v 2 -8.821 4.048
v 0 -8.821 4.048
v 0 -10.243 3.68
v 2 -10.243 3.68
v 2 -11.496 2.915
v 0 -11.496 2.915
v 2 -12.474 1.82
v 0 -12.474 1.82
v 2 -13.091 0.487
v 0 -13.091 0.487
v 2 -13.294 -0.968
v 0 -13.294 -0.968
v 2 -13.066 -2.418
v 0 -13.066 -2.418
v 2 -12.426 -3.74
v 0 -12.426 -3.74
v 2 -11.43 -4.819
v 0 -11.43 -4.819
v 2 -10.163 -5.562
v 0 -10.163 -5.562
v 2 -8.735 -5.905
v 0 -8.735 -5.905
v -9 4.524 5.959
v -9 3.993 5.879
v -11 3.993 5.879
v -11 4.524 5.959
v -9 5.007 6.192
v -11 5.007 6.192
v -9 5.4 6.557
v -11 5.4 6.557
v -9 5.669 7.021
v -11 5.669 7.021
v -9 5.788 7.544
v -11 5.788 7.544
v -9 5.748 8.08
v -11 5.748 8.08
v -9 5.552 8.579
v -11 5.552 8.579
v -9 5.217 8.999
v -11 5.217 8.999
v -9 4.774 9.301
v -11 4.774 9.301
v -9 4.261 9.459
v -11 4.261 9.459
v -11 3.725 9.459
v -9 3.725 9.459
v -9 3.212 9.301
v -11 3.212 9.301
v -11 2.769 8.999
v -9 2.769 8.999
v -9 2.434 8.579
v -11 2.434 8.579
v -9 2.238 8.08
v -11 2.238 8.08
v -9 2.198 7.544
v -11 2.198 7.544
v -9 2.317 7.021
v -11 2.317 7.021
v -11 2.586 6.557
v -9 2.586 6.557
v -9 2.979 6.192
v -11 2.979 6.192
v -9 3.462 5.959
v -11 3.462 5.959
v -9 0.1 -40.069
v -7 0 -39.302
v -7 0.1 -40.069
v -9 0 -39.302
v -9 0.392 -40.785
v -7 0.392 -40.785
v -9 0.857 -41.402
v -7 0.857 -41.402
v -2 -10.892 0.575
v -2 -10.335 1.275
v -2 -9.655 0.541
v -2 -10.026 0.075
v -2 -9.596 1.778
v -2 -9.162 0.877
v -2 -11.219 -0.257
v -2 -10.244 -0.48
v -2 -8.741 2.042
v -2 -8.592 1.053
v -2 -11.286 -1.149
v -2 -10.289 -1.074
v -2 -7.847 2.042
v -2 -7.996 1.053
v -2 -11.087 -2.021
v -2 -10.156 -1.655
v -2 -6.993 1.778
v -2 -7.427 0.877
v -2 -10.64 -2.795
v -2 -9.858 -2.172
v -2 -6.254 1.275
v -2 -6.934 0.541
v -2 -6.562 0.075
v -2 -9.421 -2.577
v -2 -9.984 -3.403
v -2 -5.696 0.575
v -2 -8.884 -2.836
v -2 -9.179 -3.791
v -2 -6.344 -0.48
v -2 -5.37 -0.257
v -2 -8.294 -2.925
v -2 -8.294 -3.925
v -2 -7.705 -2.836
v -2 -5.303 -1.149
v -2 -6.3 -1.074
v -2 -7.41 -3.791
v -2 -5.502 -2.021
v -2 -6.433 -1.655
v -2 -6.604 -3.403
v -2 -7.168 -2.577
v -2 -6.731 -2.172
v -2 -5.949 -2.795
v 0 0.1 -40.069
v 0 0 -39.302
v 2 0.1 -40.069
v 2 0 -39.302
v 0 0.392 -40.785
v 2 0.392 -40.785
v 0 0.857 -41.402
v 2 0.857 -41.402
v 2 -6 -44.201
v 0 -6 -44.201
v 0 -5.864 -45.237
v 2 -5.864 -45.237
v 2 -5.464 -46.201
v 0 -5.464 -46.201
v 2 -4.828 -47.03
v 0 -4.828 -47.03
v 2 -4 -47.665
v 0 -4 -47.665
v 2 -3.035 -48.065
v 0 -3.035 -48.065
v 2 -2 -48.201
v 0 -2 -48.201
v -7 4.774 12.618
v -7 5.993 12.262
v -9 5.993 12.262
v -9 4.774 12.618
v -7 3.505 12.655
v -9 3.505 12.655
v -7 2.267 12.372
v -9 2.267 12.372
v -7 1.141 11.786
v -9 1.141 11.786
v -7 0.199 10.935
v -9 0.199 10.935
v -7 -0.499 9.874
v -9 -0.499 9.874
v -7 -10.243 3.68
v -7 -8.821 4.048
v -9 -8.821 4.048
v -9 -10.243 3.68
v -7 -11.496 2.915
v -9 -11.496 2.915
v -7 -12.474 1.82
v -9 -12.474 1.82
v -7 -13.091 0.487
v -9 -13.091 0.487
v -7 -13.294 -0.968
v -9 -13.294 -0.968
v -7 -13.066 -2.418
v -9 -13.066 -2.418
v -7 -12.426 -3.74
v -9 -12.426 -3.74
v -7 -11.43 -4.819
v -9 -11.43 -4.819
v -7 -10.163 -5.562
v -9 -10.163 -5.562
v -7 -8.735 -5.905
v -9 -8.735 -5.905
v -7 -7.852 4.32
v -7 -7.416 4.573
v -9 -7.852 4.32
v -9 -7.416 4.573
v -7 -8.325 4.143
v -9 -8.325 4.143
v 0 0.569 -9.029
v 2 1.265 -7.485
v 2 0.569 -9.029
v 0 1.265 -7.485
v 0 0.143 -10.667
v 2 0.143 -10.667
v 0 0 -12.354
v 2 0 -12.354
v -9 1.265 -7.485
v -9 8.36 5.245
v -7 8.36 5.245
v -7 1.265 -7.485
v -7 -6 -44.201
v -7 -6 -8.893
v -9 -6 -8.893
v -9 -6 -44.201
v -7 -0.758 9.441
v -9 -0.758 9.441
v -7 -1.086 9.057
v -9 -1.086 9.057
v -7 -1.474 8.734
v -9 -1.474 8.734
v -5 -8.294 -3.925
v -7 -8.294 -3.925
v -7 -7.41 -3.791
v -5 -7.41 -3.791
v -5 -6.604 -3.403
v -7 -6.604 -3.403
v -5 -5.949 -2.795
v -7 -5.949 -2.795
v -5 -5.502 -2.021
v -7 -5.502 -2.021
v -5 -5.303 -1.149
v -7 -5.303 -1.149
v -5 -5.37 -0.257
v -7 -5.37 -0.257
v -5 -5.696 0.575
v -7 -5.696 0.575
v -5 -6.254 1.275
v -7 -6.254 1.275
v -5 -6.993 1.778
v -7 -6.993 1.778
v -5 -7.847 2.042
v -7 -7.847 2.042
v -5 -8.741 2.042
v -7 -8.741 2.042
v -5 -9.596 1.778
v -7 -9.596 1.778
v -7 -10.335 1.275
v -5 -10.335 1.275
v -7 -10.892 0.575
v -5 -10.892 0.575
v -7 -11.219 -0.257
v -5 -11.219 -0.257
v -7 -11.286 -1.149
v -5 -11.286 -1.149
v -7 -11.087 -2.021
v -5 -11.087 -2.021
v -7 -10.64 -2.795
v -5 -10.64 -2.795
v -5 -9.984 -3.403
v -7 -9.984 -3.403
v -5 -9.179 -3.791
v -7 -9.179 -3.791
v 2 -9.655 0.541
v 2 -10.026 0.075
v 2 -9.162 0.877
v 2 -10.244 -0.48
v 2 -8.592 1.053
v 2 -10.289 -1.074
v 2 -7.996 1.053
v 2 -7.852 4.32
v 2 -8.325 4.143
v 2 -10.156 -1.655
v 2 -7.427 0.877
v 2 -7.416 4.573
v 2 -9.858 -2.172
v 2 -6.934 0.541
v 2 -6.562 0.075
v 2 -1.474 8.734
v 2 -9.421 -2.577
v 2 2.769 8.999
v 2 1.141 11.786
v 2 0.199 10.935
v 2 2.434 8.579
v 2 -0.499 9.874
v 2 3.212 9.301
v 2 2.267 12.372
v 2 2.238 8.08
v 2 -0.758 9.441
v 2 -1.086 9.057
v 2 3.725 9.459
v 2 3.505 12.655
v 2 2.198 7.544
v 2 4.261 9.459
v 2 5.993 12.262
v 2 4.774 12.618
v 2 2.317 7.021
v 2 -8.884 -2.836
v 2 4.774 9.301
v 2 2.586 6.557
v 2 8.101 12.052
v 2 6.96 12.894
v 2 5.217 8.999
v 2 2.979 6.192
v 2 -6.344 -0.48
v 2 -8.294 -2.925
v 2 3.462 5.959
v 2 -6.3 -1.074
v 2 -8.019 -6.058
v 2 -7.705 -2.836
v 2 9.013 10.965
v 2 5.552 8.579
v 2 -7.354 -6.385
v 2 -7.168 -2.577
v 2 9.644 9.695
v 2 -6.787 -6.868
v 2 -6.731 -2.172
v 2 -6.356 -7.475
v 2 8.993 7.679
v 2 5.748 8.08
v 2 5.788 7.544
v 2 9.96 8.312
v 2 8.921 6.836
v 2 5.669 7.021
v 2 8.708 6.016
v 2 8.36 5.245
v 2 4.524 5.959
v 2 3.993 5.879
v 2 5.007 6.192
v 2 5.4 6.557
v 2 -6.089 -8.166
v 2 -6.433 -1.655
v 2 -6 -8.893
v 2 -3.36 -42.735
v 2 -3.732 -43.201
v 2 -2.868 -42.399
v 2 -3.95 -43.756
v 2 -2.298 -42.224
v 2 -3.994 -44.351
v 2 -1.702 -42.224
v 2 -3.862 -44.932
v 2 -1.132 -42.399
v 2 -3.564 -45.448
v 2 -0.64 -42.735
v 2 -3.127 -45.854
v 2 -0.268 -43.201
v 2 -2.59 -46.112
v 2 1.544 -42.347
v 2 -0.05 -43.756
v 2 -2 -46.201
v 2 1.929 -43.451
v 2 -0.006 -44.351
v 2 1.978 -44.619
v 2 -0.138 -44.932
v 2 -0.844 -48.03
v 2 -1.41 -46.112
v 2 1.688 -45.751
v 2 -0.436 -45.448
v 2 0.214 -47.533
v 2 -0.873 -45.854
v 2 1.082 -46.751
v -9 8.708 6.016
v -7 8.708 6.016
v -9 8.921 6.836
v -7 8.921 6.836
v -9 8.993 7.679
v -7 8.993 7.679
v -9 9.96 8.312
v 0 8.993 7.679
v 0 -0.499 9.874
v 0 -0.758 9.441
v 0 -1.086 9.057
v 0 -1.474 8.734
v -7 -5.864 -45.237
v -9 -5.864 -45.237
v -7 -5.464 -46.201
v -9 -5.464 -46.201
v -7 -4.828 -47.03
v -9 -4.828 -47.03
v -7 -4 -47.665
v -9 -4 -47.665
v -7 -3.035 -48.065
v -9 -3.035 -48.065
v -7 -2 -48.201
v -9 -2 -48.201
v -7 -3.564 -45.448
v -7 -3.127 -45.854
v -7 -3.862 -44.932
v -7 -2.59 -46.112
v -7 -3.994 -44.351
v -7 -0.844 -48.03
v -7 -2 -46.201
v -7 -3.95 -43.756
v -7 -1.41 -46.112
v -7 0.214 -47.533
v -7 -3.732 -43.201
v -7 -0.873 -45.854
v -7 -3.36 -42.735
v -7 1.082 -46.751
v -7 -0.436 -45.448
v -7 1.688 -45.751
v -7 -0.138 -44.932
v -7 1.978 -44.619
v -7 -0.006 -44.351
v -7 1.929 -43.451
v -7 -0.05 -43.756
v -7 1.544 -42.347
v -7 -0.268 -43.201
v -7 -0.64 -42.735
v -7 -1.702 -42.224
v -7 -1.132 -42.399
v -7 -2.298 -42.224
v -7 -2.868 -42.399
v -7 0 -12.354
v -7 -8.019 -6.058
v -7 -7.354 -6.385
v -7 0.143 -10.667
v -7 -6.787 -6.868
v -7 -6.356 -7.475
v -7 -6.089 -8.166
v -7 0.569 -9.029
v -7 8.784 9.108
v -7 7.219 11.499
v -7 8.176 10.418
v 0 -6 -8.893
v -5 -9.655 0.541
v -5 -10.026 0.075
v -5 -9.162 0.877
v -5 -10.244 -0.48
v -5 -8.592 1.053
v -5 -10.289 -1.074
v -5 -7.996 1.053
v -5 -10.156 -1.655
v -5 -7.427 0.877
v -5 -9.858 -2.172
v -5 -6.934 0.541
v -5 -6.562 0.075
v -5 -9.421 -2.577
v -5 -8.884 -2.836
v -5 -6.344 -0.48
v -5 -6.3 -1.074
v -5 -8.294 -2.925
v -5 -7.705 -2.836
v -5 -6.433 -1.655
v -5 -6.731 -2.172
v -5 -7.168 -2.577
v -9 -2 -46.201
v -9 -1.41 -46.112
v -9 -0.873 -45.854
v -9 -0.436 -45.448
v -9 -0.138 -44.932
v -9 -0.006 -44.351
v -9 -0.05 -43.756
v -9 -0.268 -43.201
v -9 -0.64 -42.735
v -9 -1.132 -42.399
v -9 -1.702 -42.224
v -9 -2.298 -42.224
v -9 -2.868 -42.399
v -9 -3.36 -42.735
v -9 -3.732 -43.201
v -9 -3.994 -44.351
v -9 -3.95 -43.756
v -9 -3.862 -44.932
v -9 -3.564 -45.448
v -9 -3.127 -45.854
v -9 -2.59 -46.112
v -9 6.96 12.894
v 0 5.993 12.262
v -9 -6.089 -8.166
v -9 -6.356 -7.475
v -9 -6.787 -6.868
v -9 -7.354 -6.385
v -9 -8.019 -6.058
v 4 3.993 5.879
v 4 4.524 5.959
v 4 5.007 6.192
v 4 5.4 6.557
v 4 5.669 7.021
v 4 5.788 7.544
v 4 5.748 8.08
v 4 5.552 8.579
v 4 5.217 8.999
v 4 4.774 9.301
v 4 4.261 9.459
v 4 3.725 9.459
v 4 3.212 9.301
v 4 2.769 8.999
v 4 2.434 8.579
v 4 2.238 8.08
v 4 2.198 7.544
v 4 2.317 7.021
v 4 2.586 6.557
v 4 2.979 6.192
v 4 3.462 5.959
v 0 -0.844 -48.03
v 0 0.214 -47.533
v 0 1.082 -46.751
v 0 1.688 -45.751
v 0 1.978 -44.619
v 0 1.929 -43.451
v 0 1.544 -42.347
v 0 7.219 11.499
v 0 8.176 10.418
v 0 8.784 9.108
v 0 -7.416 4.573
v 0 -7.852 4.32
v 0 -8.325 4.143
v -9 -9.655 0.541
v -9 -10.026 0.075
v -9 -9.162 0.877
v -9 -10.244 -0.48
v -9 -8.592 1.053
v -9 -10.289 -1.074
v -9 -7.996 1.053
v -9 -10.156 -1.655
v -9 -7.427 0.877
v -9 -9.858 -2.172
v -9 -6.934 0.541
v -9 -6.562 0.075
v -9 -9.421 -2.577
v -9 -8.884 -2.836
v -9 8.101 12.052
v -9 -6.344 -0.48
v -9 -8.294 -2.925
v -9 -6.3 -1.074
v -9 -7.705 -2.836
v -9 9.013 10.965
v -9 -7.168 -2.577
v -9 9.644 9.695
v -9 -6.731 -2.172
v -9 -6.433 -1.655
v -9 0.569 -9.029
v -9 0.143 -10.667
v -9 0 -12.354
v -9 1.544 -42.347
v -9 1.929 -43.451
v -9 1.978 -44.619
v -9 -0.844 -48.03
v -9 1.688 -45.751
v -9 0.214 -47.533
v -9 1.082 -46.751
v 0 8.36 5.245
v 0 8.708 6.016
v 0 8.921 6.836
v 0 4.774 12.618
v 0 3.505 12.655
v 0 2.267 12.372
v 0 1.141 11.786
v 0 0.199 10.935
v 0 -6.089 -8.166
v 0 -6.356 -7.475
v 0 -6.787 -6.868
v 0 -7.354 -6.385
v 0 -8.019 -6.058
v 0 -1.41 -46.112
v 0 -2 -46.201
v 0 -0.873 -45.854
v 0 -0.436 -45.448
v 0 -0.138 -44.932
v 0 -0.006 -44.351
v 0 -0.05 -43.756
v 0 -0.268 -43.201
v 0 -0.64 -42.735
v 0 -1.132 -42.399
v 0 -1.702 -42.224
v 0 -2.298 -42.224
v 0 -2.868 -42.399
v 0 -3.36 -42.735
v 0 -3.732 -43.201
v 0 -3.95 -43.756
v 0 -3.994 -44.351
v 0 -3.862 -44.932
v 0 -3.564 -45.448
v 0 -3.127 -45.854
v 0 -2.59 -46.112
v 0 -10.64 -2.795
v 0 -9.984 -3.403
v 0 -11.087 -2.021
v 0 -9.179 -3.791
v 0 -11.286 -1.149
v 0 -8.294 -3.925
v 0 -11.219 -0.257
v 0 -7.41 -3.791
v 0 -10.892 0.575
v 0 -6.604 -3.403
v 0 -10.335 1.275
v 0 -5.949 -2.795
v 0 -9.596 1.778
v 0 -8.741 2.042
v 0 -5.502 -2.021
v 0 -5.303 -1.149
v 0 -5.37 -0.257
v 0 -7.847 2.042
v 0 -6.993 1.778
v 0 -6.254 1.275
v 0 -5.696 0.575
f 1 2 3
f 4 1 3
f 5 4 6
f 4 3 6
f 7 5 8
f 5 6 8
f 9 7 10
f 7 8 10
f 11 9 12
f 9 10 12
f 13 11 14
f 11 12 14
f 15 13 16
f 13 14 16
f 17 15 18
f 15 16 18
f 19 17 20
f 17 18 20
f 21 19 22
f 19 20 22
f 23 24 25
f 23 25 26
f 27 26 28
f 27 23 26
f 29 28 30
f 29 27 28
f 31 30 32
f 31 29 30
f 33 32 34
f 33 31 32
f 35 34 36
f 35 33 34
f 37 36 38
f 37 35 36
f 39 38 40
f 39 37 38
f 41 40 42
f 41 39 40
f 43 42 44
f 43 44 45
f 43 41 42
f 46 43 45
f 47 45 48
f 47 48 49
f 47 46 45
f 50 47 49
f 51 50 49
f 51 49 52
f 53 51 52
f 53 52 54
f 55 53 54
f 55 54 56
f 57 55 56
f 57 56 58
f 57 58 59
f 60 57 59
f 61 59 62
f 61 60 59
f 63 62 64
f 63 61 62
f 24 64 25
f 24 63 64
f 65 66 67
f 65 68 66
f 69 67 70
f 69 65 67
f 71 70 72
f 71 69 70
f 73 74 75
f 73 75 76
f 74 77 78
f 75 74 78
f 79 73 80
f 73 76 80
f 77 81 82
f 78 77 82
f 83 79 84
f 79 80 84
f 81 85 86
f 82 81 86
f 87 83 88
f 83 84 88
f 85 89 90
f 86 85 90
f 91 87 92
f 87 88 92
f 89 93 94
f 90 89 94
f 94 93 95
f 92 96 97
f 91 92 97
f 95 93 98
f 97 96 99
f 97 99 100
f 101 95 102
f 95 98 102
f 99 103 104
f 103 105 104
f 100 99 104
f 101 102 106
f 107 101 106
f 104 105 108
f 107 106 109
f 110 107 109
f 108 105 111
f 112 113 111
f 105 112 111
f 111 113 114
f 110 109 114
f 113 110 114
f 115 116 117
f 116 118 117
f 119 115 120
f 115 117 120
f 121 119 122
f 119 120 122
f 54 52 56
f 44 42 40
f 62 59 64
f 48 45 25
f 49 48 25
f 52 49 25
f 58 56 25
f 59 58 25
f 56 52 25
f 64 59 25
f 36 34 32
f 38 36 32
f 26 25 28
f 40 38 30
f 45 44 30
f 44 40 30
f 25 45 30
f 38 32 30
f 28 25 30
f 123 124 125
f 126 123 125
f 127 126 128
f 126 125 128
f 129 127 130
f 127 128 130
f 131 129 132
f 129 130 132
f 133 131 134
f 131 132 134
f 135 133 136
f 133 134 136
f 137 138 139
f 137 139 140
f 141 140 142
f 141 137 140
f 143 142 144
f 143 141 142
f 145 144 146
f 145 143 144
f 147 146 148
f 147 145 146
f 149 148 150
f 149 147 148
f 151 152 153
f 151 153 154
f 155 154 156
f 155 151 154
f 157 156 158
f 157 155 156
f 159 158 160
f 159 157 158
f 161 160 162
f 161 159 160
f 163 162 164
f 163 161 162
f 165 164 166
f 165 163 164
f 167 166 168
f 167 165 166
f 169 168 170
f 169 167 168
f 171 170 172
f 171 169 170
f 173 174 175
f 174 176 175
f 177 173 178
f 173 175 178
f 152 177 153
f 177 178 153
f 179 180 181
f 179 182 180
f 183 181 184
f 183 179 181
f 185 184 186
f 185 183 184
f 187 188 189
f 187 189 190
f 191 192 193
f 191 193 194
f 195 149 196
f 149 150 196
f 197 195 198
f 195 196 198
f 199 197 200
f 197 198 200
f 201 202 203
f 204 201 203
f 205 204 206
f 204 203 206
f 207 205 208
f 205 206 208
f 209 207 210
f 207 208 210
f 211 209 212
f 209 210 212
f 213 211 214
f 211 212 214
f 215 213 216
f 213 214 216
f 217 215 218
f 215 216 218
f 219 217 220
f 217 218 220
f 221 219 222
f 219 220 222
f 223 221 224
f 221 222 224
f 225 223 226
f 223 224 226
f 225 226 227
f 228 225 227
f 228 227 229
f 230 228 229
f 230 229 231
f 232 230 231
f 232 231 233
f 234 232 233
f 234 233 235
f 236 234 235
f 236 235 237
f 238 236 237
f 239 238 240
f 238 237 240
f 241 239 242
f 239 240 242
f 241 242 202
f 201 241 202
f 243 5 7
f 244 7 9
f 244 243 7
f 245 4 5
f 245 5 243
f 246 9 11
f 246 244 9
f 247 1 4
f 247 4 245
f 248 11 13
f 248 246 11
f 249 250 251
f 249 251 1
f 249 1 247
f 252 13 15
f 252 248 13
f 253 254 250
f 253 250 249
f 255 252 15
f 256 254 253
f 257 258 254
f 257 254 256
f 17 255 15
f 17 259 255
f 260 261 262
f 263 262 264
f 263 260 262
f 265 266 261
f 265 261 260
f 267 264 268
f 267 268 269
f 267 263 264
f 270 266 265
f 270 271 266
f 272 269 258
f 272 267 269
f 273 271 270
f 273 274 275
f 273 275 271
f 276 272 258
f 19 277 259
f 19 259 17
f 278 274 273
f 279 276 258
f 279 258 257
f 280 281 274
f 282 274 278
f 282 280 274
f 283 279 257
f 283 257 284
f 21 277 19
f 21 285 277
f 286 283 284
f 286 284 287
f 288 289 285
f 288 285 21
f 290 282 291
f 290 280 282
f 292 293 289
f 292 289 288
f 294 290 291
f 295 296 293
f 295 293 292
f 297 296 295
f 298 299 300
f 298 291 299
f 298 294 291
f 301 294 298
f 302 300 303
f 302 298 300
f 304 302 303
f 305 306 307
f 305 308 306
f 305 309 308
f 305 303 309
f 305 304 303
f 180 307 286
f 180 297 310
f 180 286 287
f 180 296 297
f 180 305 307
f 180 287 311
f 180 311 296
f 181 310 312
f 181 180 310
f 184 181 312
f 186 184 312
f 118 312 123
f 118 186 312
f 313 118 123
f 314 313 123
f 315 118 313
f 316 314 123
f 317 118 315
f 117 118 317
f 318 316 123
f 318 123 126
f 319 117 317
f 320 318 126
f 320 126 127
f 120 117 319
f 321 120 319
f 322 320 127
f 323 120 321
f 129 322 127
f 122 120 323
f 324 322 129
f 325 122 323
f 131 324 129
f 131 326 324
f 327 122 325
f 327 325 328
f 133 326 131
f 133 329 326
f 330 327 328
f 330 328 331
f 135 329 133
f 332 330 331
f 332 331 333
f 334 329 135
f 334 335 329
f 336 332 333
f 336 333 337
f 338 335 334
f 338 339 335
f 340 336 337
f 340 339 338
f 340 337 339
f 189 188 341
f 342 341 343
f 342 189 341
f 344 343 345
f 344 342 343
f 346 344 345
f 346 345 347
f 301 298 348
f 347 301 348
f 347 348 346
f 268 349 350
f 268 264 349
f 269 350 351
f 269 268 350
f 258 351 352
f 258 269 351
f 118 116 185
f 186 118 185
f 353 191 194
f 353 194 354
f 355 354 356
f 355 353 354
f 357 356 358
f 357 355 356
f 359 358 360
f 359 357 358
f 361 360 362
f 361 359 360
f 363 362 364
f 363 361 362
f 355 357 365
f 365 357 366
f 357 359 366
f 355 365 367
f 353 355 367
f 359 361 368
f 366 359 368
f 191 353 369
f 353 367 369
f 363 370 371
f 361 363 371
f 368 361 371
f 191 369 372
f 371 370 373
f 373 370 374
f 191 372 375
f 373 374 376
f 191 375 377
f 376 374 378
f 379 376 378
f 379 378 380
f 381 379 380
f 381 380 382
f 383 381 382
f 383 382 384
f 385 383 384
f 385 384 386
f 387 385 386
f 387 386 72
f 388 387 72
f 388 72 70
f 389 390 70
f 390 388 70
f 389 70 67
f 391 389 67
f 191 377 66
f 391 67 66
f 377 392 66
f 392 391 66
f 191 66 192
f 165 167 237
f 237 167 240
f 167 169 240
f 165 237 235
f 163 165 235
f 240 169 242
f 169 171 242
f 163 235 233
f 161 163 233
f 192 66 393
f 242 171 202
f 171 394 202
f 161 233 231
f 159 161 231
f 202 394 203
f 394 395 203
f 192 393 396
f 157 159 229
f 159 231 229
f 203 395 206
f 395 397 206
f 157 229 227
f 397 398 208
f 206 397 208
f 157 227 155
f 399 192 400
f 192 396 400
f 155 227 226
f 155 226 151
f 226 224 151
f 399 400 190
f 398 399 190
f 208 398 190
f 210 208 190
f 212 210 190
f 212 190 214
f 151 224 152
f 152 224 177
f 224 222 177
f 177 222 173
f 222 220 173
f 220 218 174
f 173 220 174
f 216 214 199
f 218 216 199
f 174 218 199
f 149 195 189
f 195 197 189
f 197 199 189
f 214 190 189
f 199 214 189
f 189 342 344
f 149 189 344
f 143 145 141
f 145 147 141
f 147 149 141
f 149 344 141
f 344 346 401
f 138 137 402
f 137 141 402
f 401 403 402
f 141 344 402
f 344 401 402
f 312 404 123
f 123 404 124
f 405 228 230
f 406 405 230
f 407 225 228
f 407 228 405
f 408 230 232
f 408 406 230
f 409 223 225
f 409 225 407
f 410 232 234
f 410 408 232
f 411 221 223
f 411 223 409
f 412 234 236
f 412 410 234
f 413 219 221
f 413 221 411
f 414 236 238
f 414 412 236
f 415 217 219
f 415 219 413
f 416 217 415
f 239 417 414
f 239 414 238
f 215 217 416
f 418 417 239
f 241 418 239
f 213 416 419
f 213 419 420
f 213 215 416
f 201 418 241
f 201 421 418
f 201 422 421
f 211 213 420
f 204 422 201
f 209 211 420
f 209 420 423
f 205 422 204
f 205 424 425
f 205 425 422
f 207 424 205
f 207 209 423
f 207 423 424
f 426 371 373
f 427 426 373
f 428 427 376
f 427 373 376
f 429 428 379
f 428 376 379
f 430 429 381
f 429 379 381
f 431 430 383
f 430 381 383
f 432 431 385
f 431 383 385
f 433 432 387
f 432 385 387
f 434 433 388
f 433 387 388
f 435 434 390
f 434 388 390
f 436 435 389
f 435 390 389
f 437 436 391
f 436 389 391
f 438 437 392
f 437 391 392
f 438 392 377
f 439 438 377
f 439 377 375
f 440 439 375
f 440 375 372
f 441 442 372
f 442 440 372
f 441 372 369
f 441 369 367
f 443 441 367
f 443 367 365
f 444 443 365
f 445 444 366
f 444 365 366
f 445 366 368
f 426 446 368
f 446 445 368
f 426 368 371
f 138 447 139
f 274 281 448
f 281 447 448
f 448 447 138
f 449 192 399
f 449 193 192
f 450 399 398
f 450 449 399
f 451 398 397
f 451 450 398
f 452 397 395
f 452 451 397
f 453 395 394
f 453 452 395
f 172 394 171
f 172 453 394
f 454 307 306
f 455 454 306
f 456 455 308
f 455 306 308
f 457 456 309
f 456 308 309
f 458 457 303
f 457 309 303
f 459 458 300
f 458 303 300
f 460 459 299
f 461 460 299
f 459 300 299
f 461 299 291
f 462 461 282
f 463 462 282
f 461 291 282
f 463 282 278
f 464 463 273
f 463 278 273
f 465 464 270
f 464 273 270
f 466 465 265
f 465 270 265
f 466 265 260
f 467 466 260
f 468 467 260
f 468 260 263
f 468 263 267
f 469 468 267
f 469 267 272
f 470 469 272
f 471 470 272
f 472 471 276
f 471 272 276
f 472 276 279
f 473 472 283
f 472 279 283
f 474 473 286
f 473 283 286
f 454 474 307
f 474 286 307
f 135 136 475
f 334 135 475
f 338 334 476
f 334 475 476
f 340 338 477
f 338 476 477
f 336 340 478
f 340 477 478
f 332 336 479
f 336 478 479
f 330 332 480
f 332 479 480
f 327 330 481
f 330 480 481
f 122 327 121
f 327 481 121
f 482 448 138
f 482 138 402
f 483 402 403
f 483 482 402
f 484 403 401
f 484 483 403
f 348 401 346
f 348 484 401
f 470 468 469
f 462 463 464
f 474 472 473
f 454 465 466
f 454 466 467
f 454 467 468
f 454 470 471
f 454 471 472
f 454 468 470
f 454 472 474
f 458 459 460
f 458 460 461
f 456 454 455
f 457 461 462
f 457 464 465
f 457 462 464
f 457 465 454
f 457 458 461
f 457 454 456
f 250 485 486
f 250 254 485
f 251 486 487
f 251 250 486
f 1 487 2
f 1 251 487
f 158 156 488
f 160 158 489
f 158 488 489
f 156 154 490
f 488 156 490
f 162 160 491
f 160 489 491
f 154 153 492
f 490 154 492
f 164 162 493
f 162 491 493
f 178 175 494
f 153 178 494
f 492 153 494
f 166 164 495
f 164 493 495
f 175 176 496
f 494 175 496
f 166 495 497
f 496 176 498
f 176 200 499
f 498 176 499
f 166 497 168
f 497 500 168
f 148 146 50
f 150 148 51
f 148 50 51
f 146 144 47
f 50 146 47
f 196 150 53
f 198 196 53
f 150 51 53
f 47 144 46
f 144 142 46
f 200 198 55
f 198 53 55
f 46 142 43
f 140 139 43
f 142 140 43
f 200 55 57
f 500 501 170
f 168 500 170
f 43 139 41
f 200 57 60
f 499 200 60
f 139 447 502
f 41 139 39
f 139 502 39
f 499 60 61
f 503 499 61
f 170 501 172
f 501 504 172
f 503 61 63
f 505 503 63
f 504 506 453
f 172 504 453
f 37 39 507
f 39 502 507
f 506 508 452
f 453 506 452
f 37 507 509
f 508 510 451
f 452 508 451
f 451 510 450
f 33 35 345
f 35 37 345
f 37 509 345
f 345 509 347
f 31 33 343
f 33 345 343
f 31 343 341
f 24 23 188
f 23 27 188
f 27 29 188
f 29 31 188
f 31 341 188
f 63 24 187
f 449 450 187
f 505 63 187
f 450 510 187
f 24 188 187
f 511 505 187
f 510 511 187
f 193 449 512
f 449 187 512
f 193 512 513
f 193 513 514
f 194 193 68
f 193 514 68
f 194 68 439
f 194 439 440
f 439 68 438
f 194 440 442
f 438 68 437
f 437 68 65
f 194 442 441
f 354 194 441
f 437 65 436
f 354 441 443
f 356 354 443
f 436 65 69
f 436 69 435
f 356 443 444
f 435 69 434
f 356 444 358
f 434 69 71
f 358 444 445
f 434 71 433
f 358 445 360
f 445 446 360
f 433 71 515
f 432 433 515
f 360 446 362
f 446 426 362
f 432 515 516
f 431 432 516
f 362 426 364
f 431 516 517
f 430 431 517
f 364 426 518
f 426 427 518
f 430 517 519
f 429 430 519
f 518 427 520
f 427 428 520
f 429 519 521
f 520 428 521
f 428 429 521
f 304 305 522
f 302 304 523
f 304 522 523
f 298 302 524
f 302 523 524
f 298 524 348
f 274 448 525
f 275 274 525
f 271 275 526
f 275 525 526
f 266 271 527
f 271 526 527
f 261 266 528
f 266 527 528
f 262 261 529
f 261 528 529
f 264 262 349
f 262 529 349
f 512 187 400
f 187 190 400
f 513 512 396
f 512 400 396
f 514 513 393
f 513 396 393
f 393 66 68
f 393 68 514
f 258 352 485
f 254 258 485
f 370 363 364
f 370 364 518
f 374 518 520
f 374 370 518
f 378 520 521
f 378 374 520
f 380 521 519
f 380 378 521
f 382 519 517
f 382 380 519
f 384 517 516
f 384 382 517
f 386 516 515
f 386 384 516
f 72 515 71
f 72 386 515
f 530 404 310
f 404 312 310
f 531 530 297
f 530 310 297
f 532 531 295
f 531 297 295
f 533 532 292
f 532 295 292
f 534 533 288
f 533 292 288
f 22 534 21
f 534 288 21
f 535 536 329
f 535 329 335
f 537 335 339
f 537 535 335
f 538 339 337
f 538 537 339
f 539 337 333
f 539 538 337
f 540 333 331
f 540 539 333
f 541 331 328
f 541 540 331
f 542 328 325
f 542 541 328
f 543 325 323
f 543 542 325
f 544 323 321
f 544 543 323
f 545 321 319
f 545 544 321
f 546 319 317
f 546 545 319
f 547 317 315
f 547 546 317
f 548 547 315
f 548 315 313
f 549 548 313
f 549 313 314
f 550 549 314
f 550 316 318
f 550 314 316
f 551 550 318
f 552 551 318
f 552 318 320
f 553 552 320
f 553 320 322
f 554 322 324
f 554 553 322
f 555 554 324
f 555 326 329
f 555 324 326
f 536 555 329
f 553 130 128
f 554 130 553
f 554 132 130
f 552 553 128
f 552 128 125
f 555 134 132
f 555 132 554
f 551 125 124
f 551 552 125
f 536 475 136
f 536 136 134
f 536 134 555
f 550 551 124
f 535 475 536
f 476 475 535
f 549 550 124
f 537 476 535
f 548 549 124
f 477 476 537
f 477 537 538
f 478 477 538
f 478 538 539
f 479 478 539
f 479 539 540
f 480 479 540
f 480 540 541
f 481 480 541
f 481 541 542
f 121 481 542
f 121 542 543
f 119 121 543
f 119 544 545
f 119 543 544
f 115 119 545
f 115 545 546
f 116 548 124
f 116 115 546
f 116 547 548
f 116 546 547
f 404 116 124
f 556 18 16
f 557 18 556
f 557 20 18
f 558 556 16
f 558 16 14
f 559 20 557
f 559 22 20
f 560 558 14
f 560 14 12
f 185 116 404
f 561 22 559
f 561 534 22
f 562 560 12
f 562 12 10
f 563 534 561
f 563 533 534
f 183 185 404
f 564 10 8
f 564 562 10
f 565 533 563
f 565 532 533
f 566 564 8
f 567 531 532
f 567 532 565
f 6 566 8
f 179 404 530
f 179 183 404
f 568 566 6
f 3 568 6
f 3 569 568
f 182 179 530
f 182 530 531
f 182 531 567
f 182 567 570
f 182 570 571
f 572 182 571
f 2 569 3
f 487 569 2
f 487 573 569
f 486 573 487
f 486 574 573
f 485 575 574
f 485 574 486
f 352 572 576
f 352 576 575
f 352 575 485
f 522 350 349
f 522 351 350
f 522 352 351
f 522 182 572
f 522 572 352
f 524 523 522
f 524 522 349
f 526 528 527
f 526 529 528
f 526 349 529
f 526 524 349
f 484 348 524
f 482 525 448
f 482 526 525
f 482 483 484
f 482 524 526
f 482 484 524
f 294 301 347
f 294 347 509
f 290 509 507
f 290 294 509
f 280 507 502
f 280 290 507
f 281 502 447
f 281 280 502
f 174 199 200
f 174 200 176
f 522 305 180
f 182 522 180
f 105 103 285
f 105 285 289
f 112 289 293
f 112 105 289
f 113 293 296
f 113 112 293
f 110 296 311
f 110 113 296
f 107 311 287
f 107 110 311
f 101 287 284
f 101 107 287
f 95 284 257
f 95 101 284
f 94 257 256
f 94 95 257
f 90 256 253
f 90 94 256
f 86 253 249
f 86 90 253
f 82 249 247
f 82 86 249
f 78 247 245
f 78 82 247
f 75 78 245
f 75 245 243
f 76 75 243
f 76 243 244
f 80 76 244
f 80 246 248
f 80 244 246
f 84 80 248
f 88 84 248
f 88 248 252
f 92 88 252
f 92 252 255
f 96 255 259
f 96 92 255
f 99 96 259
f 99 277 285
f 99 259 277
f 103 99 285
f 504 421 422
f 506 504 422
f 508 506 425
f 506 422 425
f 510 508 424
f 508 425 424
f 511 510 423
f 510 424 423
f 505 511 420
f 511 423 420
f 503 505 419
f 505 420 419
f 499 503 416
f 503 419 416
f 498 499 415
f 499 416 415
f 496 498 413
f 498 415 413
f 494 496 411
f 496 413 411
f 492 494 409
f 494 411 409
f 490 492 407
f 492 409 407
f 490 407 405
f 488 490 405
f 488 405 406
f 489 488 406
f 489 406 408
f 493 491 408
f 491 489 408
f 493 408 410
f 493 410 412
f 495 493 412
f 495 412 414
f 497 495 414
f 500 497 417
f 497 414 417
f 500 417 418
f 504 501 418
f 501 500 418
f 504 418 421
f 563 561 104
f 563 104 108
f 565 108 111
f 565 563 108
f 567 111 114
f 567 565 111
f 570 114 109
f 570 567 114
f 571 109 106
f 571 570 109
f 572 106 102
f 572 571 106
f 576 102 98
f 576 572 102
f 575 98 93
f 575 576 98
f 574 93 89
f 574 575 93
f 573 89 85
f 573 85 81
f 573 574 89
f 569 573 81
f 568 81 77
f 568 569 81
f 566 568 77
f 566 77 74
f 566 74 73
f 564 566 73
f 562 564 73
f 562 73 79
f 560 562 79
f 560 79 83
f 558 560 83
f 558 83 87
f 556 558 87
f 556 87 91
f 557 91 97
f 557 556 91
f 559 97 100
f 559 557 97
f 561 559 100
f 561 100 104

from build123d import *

# Parameters (mm, degrees)
EXTRUDE_1_DEPTH          = 2
SKETCH_1_4_R             = 3
EXTRUDE_2_DEPTH          = 2
CUT_EXTRUDE_1_DEPTH      = 51.040969284
CUT_EXTRUDE_1_DEPTH_BACK = 51.040969284
SKETCH_1_3_R             = 2
FILLET_1_R               = 3
EXTRUDE_START            = -2
SKETCH_2_R               = 2
EXTRUDE_3_DEPTH          = 2
SKETCH_2_3_R             = 1.8
EXTRUDE_4_DEPTH          = 2
EXTRUDE_6_DEPTH          = 2
EXTRUDE_START_2          = -5.5
EXTRUDE_5_DEPTH          = 5.5
FILLET_3_R               = 10


with BuildPart() as part:
    # 草图1 → 凸台-拉伸1 (new body)
    with BuildSketch(Plane(origin=(0, 0, 0), x_dir=(0, 0, -1), z_dir=(1, 0, 0))):
        with BuildLine():
            Line((40.737143614, 0), (0, 0))
            Line((0, 0), (2.48051592, -3.542543867))
            ThreePointArc((2.48051592, -3.542543867), (4.165783411, -4.487079684), (5.367176995, -6))
            Line((5.367176995, -6), (44.201245229, -6))
            ThreePointArc((44.201245229, -6), (40.737143614, -4), (40.737143614, 0))
        make_face()
        with BuildLine():
            Line((2.48051592, -3.542543867), (0, 0))
            Line((0, 0), (-2.681672007, 3.829824531))
            ThreePointArc((-2.681672007, 3.829824531), (-4.811127311, -0.102785303), (-9.234888361, -0.758786959))
            Line((-9.234888361, -0.758786959), (-4.072700434, -8.131155358))
            ThreePointArc((-4.072700434, -8.131155358), (-1.94324513, -4.198545524), (2.48051592, -3.542543867))
        make_face()
        with BuildLine():
            ThreePointArc((48.201245229, -2), (45.23652141, 1.863703305), (40.737143614, 0))
            Line((40.737143614, 0), (44.201245229, 0))
            ThreePointArc((44.201245229, 0), (45.615458792, -0.585786438), (46.201245229, -2))
            ThreePointArc((46.201245229, -2), (45.615458792, -3.414213562), (44.201245229, -4))
            Line((44.201245229, -4), (44.201245229, -6))
            ThreePointArc((44.201245229, -6), (47.029672354, -4.828427125), (48.201245229, -2))
        make_face()
        with BuildLine():
            Line((44.201245229, 0), (40.737143614, 0))
            ThreePointArc((40.737143614, 0), (40.737143614, -4), (44.201245229, -6))
            Line((44.201245229, -6), (44.201245229, -4))
            ThreePointArc((44.201245229, -4), (42.201245229, -2), (44.201245229, 0))
        make_face()
        with BuildLine():
            ThreePointArc((5.367176995, -6), (4.165783411, -4.487079684), (2.48051592, -3.542543867))
            Line((2.48051592, -3.542543867), (4.201245229, -6))
            Line((4.201245229, -6), (5.367176995, -6))
        make_face()
        with BuildLine():
            Line((4.201245229, -6), (2.48051592, -3.542543867))
            ThreePointArc((2.48051592, -3.542543867), (-1.94324513, -4.198545524), (-4.072700434, -8.131155358))
            Line((-4.072700434, -8.131155358), (-2.351971125, -10.588611491))
            Line((-2.351971125, -10.588611491), (-1.532819081, -10.015035054))
            ThreePointArc((-1.532819081, -10.015035054), (-0.796092257, -5.836849613), (3.382093185, -6.573576436))
            Line((3.382093185, -6.573576436), (4.201245229, -6))
        make_face()
        with BuildLine():
            ThreePointArc((-9.234888361, -0.758786959), (-4.811127311, -0.102785303), (-2.681672007, 3.829824531))
            Line((-2.681672007, 3.829824531), (-4.402401316, 6.287280664))
            Line((-4.402401316, 6.287280664), (-6.040705405, 5.140127792))
            ThreePointArc((-6.040705405, 5.140127792), (-5.771575592, 4.594386518), (-5.679009493, 3.992974919))
            ThreePointArc((-5.679009493, 3.992974919), (-7.077597894, 2.085541017), (-9.317313582, 2.845822046))
            Line((-9.317313582, 2.845822046), (-10.95561767, 1.698669174))
            Line((-10.95561767, 1.698669174), (-9.234888361, -0.758786959))
        make_face()
        with BuildLine():
            Line((-4.402401316, 6.287280664), (-2.681672007, 3.829824531))
            ThreePointArc((-2.681672007, 3.829824531), (-2.679675166, 3.911388863), (-2.679009493, 3.992974919))
            ThreePointArc((-2.679009493, 3.992974919), (-10.613341245, 8.041394014), (-9.234888361, -0.758786959))
            Line((-9.234888361, -0.758786959), (-10.95561767, 1.698669174))
            Line((-10.95561767, 1.698669174), (-9.317313582, 2.845822046))
            ThreePointArc((-9.317313582, 2.845822046), (-8.826162366, 5.631279008), (-6.040705405, 5.140127792))
            Line((-6.040705405, 5.140127792), (-4.402401316, 6.287280664))
        make_face()
        with BuildLine():
            ThreePointArc((46.201245229, -2), (45.615458792, -0.585786438), (44.201245229, 0))
            Line((44.201245229, 0), (44.201245229, -4))
            ThreePointArc((44.201245229, -4), (45.615458792, -3.414213562), (46.201245229, -2))
        make_face()
        with BuildLine():
            Line((44.201245229, -4), (44.201245229, 0))
            ThreePointArc((44.201245229, 0), (42.201245229, -2), (44.201245229, -4))
        make_face()
        with BuildLine():
            Line((5.367176995, -6), (4.201245229, -6))
            Line((4.201245229, -6), (3.382093185, -6.573576436))
            ThreePointArc((3.382093185, -6.573576436), (3.785787904, -7.392188347), (3.924637052, -8.294305745))
            ThreePointArc((3.924637052, -8.294305745), (1.826754451, -11.155456598), (-1.532819081, -10.015035054))
            Line((-1.532819081, -10.015035054), (-2.351971125, -10.588611491))
            Line((-2.351971125, -10.588611491), (-4.072700434, -8.131155358))
            ThreePointArc((-4.072700434, -8.131155358), (0.843050996, -13.293640073), (5.924637052, -8.294305745))
            ThreePointArc((5.924637052, -8.294305745), (5.783273678, -7.113776143), (5.367176995, -6))
        make_face()
        with BuildLine():
            ThreePointArc((3.924637052, -8.294305745), (3.785787904, -7.392188347), (3.382093185, -6.573576436))
            Line((3.382093185, -6.573576436), (2.562941141, -7.147152873))
            ThreePointArc((2.562941141, -7.147152873), (2.832070954, -7.692894146), (2.924637052, -8.294305745))
            ThreePointArc((2.924637052, -8.294305745), (1.526048651, -10.201739647), (-0.713667036, -9.441458618))
            Line((-0.713667036, -9.441458618), (-1.532819081, -10.015035054))
            ThreePointArc((-1.532819081, -10.015035054), (1.826754451, -11.155456598), (3.924637052, -8.294305745))
        make_face()
        with BuildLine():
            Line((2.562941141, -7.147152873), (3.382093185, -6.573576436))
            ThreePointArc((3.382093185, -6.573576436), (-0.796092257, -5.836849613), (-1.532819081, -10.015035054))
            Line((-1.532819081, -10.015035054), (-0.713667036, -9.441458618))
            ThreePointArc((-0.713667036, -9.441458618), (-0.222515821, -6.656001657), (2.562941141, -7.147152873))
        make_face()
        with BuildLine():
            ThreePointArc((-5.679009493, 3.992974919), (-5.771575592, 4.594386518), (-6.040705405, 5.140127792))
            Line((-6.040705405, 5.140127792), (-9.317313582, 2.845822046))
            ThreePointArc((-9.317313582, 2.845822046), (-7.077597894, 2.085541017), (-5.679009493, 3.992974919))
        make_face()
        with BuildLine():
            Line((-9.317313582, 2.845822046), (-6.040705405, 5.140127792))
            ThreePointArc((-6.040705405, 5.140127792), (-8.826162366, 5.631279008), (-9.317313582, 2.845822046))
        make_face()
        with BuildLine():
            ThreePointArc((2.924637052, -8.294305745), (2.832070954, -7.692894146), (2.562941141, -7.147152873))
            Line((2.562941141, -7.147152873), (-0.713667036, -9.441458618))
            ThreePointArc((-0.713667036, -9.441458618), (1.526048651, -10.201739647), (2.924637052, -8.294305745))
        make_face()
        with BuildLine():
            Line((-0.713667036, -9.441458618), (2.562941141, -7.147152873))
            ThreePointArc((2.562941141, -7.147152873), (-0.222515821, -6.656001657), (-0.713667036, -9.441458618))
        make_face()
    extrude(amount=EXTRUDE_1_DEPTH)

    # 草图1<4> → 凸台-拉伸2 (add)
    with BuildSketch(Plane(origin=(0, 0, 0), x_dir=(0, 0, -1), z_dir=(1, 0, 0))):
        with Locations((0.924637052, -8.294305745)):
            Circle(SKETCH_1_4_R)
    extrude(amount=-EXTRUDE_2_DEPTH)

    # 草图1<3> → 切除-拉伸1 (cut, two sides: drawn at the far end of the back side and taken through both)
    with BuildSketch(Plane(origin=(0, 0, 0), x_dir=(0, 0, -1), z_dir=(1, 0, 0)).offset(-CUT_EXTRUDE_1_DEPTH_BACK)):
        with Locations((-7.679009493, 3.992974919)):
            Circle(SKETCH_1_3_R)
        with Locations((44.201245229, -2)):
            Circle(SKETCH_1_3_R)
        with Locations((0.924637052, -8.294305745)):
            Circle(SKETCH_1_3_R)
    extrude(amount=CUT_EXTRUDE_1_DEPTH + CUT_EXTRUDE_1_DEPTH_BACK, mode=Mode.SUBTRACT)

    # 圆角1
    fillet_1_edges = [part.edges().sort_by_distance(p)[0] for p in [
        (1, -6, -5.367176995),
        (1, 0, 0),
        (1, 0, -40.737143614),
        (1, -0.758786959, 9.234888361),
        (1, -8.131155358, 4.072700434),
    ]]
    fillet(fillet_1_edges, radius=FILLET_1_R)

    # 草图2 → 凸台-拉伸3 (add)
    with BuildSketch(Plane(origin=(2, 0, 0), x_dir=(0, 0, -1), z_dir=(1, 0, 0)).offset(EXTRUDE_START)):
        with Locations((-7.679009493, 3.992974919)):
            Circle(SKETCH_2_R)
    extrude(amount=EXTRUDE_3_DEPTH)

    # 草图2<3> → 凸台-拉伸4 (add)
    with BuildSketch(Plane(origin=(2, 0, 0), x_dir=(0, 0, -1), z_dir=(1, 0, 0))):
        with Locations((-7.679009493, 3.992974919)):
            Circle(SKETCH_2_3_R)
    extrude(amount=EXTRUDE_4_DEPTH)

    # 草图4 → 凸台-拉伸6 (add)
    with BuildSketch(Plane(origin=(2, 0, 0), x_dir=(0, 0, -1), z_dir=(1, 0, 0))):
        Polygon((-5.244772745, 8.360410259), (9.755227255, 0), (-5.244772745, 0), align=None)
    extrude(amount=-EXTRUDE_6_DEPTH)

    # 草图3 → 凸台-拉伸5 (add)
    with BuildSketch(Plane(origin=(2, 0, 0), x_dir=(0, 0, -1), z_dir=(1, 0, 0)).offset(EXTRUDE_START_2)):
        with BuildLine():
            Line((-12.894335644, 6.959517206), (-12.261585188, 5.992974919))
            ThreePointArc((-12.261585188, 5.992974919), (-10.417622281, 8.176275052), (-7.679009493, 8.992974919))
            Line((-7.679009493, 8.992974919), (-8.311759949, 9.959517206))
            ThreePointArc((-8.311759949, 9.959517206), (-10.965344838, 9.012935078), (-12.894335644, 6.959517206))
        make_face()
    extrude(amount=EXTRUDE_5_DEPTH)

    # 圆角3
    fillet_3_edges = [part.edges().sort_by_distance(p)[0] for p in [
        (1, 0, -9.755227255),
    ]]
    fillet(fillet_3_edges, radius=FILLET_3_R)

    # 镜向1: part across plane


with BuildPart() as part_1:
    add(part.part)
    add(part.part.mirror(Plane.ZY.offset(3.5)))


solid = part_1.part
